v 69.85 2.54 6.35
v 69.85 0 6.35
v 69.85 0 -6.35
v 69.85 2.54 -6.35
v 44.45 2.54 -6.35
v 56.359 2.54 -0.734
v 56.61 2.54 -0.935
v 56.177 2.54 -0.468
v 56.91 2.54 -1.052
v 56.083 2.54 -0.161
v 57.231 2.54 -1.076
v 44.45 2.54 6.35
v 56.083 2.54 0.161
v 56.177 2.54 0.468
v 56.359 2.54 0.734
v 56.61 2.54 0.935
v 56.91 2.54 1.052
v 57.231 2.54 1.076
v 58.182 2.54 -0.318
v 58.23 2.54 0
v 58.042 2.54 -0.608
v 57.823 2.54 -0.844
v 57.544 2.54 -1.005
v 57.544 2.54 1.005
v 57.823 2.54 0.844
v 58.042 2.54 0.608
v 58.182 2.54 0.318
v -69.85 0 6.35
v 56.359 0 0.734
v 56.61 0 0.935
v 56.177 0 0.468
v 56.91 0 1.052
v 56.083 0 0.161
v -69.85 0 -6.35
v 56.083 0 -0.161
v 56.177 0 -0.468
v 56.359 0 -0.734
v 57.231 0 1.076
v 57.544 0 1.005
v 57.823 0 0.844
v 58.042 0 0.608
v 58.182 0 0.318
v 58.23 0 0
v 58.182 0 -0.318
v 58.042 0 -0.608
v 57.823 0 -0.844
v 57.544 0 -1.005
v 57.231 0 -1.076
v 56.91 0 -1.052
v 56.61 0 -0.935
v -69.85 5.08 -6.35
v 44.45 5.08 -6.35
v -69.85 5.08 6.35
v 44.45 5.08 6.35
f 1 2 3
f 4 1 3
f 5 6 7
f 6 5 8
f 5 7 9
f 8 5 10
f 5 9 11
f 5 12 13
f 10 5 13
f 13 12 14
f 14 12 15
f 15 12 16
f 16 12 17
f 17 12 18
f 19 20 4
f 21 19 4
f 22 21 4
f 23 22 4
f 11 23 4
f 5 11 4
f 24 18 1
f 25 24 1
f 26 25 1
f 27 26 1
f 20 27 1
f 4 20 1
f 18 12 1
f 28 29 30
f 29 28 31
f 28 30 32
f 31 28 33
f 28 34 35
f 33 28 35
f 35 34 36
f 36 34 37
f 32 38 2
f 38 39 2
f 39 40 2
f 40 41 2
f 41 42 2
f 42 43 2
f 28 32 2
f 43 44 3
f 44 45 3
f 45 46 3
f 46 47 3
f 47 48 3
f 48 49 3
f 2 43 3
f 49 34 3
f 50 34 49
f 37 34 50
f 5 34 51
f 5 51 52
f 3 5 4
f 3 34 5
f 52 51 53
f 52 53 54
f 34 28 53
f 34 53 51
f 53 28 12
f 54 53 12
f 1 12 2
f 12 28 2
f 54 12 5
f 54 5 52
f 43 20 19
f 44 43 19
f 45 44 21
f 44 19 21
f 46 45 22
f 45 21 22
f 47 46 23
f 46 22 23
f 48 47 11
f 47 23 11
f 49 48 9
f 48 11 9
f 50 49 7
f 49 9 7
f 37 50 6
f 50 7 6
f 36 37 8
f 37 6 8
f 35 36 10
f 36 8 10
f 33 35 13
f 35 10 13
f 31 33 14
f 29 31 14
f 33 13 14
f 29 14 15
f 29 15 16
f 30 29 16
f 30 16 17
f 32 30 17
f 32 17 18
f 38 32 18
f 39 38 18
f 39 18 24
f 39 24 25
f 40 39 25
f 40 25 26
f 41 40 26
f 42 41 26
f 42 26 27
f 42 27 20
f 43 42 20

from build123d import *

# Parameters (mm, degrees)
SKETCH1_W           = 139.7
SKETCH1_H           = 12.7
BOSS_EXTRUDE1_DEPTH = 5.08
SKETCH3_W           = 25.4
SKETCH3_H           = 2.54
CUT_EXTRUDE1_DEPTH  = 17.78
SKETCH4_R           = 1.0795
CUT_EXTRUDE2_DEPTH  = 17.78


with BuildPart() as part:
    # Sketch1 → Boss-Extrude1 (new body)
    with BuildSketch(Plane(origin=(0, 0, 0), x_dir=(1, 0, 0), z_dir=(0, 1, 0))):
        Rectangle(SKETCH1_W, SKETCH1_H)
    extrude(amount=BOSS_EXTRUDE1_DEPTH)

    # Sketch3 → Cut-Extrude1 (cut)
    with BuildSketch(Plane.XY.offset(6.35)):
        with Locations((57.15, 3.81)):
            Rectangle(SKETCH3_W, SKETCH3_H)
    extrude(amount=-CUT_EXTRUDE1_DEPTH, mode=Mode.SUBTRACT)

    # Sketch4 → Cut-Extrude2 (cut)
    with BuildSketch(Plane(origin=(0, 2.54, 0), x_dir=(1, 0, 0), z_dir=(0, 1, 0))):
        with Locations((57.15, 0)):
            Circle(SKETCH4_R)
    extrude(amount=-CUT_EXTRUDE2_DEPTH, mode=Mode.SUBTRACT)


solid = part.part
